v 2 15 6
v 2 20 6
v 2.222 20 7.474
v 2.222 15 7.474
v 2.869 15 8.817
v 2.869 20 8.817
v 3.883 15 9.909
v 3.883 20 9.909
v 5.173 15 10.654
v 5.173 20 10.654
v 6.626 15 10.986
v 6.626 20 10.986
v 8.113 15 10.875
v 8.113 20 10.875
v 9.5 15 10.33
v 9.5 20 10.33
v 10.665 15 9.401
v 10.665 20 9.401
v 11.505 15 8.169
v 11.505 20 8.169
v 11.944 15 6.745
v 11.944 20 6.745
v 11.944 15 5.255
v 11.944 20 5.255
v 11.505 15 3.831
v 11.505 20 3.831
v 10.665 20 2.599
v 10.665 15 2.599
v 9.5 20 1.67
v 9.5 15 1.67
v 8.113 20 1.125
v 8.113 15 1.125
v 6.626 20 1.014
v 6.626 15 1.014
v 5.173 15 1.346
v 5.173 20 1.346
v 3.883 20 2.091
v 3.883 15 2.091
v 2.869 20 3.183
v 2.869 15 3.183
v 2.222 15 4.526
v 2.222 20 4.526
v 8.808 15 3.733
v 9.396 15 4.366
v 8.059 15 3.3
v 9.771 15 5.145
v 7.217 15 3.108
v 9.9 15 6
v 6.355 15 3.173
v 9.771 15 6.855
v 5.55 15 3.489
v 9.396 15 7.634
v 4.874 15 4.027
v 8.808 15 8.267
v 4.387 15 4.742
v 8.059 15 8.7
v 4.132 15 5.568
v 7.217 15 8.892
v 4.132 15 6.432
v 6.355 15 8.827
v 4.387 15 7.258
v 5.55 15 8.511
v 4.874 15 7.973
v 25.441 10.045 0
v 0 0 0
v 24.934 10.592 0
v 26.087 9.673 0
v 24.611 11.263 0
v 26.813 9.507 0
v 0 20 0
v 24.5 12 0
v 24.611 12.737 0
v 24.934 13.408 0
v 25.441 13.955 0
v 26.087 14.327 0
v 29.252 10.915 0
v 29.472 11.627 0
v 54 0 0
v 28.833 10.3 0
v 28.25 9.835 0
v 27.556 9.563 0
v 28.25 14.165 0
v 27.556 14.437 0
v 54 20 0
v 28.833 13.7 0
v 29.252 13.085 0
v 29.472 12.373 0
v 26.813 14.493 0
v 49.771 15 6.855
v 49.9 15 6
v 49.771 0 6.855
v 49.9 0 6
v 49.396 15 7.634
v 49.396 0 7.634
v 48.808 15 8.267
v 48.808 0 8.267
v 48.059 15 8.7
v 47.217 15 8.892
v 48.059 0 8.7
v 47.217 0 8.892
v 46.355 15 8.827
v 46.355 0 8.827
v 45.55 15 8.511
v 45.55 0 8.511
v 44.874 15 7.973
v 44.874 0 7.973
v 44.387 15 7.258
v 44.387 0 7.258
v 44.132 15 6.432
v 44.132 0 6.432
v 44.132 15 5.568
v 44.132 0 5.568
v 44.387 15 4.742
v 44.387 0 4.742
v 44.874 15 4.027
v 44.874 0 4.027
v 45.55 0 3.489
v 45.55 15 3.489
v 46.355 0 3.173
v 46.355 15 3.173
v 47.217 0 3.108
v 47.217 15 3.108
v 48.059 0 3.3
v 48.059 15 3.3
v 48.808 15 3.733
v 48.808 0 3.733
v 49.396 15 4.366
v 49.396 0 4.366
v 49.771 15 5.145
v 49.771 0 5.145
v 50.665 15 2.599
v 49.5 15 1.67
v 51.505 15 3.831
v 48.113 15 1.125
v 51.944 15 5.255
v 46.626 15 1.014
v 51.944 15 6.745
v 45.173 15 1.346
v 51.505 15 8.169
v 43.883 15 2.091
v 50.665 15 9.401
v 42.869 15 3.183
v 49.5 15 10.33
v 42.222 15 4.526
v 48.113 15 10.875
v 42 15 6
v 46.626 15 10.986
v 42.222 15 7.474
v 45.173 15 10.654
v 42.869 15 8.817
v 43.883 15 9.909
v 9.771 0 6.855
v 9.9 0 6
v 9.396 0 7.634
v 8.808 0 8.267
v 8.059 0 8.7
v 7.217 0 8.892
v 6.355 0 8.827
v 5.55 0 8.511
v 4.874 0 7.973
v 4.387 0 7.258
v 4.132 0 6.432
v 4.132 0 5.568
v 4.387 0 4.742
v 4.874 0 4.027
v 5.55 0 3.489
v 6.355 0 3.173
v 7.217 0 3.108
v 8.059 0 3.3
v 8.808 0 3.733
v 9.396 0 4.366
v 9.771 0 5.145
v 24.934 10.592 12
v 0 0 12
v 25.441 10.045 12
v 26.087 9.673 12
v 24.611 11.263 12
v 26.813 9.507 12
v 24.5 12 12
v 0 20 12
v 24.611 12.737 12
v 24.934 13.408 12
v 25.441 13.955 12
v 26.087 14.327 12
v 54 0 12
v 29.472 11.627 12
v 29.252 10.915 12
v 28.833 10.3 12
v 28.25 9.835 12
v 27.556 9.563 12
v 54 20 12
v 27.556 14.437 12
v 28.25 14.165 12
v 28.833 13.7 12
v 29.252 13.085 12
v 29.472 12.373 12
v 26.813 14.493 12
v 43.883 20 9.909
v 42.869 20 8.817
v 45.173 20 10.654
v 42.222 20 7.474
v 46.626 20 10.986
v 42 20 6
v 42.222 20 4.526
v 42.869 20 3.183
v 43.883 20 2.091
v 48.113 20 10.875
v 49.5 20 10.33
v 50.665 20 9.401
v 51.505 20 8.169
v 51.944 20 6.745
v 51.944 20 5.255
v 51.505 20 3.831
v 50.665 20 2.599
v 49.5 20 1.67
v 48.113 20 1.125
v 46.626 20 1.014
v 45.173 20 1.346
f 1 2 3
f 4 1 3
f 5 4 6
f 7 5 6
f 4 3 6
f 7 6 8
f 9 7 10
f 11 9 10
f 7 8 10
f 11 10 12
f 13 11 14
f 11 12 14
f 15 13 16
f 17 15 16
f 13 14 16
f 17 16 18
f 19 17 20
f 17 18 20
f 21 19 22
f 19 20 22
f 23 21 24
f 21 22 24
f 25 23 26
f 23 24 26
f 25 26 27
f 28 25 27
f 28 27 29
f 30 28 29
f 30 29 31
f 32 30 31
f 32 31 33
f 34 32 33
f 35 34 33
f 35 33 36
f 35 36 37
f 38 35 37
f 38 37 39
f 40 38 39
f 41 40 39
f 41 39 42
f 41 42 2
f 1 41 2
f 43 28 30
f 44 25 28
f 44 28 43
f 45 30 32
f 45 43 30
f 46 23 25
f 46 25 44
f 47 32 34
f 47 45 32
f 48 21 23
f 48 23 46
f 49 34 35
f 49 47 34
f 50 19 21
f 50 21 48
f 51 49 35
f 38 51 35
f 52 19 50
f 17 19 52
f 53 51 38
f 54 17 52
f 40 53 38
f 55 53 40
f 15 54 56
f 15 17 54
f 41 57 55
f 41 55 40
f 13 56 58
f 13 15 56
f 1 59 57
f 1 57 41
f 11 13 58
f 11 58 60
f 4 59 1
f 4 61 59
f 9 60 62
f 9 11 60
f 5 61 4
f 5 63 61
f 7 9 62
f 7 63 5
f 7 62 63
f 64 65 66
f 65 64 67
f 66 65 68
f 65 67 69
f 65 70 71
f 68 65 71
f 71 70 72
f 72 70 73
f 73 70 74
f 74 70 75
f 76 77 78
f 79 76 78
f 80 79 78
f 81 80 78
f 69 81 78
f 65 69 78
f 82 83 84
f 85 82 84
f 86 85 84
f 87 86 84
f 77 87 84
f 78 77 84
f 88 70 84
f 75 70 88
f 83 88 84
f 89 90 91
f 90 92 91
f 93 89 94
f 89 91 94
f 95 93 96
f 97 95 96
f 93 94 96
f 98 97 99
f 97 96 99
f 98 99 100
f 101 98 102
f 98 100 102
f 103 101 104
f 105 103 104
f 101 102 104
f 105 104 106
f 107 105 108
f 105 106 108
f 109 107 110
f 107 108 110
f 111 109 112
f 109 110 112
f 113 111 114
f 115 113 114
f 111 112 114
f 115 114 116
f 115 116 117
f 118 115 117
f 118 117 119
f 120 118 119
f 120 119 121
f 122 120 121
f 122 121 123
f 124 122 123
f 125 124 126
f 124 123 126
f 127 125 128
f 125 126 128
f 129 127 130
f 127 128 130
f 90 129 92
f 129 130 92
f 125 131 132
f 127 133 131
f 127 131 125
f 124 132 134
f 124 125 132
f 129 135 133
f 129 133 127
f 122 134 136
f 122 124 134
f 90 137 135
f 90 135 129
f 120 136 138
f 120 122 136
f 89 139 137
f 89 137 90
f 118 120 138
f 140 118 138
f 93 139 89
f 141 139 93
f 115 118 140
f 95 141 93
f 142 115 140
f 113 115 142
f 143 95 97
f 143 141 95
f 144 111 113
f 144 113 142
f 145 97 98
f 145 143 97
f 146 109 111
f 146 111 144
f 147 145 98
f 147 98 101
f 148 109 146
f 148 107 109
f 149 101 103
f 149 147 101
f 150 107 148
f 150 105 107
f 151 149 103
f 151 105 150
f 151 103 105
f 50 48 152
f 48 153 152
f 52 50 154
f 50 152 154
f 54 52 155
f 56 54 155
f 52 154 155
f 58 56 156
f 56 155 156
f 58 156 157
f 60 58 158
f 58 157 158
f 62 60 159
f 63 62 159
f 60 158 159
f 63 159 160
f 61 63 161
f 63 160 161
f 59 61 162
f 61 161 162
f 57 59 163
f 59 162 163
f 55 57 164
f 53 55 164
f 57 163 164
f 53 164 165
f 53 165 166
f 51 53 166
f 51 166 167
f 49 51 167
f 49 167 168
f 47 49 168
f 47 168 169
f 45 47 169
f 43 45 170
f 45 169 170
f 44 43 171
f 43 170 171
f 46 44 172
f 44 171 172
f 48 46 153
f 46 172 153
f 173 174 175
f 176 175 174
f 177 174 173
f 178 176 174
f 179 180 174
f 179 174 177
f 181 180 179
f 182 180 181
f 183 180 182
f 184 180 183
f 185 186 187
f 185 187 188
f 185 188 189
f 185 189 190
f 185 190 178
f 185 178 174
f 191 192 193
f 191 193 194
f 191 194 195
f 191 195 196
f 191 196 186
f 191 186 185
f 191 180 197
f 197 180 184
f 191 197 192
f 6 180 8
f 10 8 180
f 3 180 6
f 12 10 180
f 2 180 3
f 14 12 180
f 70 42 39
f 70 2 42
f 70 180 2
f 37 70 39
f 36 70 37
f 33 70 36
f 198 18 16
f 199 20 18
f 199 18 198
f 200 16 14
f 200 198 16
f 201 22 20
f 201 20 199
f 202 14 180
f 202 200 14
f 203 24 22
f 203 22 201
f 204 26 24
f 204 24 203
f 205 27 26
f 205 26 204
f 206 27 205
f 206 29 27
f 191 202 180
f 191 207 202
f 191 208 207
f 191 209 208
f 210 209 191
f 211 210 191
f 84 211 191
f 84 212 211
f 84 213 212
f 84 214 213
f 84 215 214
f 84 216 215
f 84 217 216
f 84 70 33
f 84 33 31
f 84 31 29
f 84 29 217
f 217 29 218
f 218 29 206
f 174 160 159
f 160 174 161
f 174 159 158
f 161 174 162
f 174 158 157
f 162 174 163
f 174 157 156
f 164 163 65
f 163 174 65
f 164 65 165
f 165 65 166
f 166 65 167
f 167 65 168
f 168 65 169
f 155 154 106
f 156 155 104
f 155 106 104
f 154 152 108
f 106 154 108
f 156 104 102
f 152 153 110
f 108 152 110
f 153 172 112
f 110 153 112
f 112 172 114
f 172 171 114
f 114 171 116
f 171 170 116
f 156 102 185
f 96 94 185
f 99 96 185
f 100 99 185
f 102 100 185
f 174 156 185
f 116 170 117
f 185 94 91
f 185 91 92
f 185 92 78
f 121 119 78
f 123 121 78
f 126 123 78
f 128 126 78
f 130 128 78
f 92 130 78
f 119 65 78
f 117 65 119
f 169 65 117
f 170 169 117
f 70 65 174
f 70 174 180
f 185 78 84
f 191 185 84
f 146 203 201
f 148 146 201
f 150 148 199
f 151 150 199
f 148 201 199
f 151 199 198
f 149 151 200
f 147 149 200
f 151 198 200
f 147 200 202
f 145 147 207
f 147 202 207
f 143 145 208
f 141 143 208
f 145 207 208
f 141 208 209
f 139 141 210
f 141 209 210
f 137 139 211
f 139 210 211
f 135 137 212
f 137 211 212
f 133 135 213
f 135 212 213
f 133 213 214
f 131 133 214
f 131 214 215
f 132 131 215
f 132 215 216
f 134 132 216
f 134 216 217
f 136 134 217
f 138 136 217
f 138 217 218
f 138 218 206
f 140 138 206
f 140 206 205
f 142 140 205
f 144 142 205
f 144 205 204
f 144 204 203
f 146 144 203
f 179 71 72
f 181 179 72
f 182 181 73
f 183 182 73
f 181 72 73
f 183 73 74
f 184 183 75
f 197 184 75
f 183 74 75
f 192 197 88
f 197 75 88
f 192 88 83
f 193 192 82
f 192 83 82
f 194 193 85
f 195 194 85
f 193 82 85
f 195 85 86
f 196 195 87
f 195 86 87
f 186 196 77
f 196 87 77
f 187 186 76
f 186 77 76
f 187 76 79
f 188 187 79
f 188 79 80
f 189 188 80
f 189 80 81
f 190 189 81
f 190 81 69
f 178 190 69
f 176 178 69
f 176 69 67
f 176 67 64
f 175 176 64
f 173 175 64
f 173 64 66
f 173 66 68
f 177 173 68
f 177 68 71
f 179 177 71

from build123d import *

# Parameters (mm, degrees)
SKETCH_1_W                   = 54
SKETCH_1_H                   = 20
EXTRUDE_1_DEPTH              = 12
HOLE_WIZARD_M6_1_D           = 5
HOLE_WIZARD_M5_1_D           = 5.8
HOLE_WIZARD_M5_1_CBORE_D     = 10
HOLE_WIZARD_M5_1_CBORE_DEPTH = 5


with BuildPart() as part:
    # 草图1 → 凸台-拉伸1 (new body)
    with BuildSketch(Plane.XY):
        with Locations((27, 10)):
            Rectangle(SKETCH_1_W, SKETCH_1_H)
    extrude(amount=EXTRUDE_1_DEPTH)

    # M6 螺纹孔1 (through all)
    with Locations(Plane.XY.offset(12)):
        with Locations((27, 12)):
            Hole(HOLE_WIZARD_M6_1_D / 2)

    # M5 六角凹头螺钉的柱形沉头孔1 (through all)
    with Locations(Plane(origin=(0, 20, 0), x_dir=(-1, 0, 0), z_dir=(0, 1, 0))):
        with Locations((-47, 6), (-7, 6)):
            CounterBoreHole(HOLE_WIZARD_M5_1_D / 2, HOLE_WIZARD_M5_1_CBORE_D / 2, HOLE_WIZARD_M5_1_CBORE_DEPTH)


solid = part.part
